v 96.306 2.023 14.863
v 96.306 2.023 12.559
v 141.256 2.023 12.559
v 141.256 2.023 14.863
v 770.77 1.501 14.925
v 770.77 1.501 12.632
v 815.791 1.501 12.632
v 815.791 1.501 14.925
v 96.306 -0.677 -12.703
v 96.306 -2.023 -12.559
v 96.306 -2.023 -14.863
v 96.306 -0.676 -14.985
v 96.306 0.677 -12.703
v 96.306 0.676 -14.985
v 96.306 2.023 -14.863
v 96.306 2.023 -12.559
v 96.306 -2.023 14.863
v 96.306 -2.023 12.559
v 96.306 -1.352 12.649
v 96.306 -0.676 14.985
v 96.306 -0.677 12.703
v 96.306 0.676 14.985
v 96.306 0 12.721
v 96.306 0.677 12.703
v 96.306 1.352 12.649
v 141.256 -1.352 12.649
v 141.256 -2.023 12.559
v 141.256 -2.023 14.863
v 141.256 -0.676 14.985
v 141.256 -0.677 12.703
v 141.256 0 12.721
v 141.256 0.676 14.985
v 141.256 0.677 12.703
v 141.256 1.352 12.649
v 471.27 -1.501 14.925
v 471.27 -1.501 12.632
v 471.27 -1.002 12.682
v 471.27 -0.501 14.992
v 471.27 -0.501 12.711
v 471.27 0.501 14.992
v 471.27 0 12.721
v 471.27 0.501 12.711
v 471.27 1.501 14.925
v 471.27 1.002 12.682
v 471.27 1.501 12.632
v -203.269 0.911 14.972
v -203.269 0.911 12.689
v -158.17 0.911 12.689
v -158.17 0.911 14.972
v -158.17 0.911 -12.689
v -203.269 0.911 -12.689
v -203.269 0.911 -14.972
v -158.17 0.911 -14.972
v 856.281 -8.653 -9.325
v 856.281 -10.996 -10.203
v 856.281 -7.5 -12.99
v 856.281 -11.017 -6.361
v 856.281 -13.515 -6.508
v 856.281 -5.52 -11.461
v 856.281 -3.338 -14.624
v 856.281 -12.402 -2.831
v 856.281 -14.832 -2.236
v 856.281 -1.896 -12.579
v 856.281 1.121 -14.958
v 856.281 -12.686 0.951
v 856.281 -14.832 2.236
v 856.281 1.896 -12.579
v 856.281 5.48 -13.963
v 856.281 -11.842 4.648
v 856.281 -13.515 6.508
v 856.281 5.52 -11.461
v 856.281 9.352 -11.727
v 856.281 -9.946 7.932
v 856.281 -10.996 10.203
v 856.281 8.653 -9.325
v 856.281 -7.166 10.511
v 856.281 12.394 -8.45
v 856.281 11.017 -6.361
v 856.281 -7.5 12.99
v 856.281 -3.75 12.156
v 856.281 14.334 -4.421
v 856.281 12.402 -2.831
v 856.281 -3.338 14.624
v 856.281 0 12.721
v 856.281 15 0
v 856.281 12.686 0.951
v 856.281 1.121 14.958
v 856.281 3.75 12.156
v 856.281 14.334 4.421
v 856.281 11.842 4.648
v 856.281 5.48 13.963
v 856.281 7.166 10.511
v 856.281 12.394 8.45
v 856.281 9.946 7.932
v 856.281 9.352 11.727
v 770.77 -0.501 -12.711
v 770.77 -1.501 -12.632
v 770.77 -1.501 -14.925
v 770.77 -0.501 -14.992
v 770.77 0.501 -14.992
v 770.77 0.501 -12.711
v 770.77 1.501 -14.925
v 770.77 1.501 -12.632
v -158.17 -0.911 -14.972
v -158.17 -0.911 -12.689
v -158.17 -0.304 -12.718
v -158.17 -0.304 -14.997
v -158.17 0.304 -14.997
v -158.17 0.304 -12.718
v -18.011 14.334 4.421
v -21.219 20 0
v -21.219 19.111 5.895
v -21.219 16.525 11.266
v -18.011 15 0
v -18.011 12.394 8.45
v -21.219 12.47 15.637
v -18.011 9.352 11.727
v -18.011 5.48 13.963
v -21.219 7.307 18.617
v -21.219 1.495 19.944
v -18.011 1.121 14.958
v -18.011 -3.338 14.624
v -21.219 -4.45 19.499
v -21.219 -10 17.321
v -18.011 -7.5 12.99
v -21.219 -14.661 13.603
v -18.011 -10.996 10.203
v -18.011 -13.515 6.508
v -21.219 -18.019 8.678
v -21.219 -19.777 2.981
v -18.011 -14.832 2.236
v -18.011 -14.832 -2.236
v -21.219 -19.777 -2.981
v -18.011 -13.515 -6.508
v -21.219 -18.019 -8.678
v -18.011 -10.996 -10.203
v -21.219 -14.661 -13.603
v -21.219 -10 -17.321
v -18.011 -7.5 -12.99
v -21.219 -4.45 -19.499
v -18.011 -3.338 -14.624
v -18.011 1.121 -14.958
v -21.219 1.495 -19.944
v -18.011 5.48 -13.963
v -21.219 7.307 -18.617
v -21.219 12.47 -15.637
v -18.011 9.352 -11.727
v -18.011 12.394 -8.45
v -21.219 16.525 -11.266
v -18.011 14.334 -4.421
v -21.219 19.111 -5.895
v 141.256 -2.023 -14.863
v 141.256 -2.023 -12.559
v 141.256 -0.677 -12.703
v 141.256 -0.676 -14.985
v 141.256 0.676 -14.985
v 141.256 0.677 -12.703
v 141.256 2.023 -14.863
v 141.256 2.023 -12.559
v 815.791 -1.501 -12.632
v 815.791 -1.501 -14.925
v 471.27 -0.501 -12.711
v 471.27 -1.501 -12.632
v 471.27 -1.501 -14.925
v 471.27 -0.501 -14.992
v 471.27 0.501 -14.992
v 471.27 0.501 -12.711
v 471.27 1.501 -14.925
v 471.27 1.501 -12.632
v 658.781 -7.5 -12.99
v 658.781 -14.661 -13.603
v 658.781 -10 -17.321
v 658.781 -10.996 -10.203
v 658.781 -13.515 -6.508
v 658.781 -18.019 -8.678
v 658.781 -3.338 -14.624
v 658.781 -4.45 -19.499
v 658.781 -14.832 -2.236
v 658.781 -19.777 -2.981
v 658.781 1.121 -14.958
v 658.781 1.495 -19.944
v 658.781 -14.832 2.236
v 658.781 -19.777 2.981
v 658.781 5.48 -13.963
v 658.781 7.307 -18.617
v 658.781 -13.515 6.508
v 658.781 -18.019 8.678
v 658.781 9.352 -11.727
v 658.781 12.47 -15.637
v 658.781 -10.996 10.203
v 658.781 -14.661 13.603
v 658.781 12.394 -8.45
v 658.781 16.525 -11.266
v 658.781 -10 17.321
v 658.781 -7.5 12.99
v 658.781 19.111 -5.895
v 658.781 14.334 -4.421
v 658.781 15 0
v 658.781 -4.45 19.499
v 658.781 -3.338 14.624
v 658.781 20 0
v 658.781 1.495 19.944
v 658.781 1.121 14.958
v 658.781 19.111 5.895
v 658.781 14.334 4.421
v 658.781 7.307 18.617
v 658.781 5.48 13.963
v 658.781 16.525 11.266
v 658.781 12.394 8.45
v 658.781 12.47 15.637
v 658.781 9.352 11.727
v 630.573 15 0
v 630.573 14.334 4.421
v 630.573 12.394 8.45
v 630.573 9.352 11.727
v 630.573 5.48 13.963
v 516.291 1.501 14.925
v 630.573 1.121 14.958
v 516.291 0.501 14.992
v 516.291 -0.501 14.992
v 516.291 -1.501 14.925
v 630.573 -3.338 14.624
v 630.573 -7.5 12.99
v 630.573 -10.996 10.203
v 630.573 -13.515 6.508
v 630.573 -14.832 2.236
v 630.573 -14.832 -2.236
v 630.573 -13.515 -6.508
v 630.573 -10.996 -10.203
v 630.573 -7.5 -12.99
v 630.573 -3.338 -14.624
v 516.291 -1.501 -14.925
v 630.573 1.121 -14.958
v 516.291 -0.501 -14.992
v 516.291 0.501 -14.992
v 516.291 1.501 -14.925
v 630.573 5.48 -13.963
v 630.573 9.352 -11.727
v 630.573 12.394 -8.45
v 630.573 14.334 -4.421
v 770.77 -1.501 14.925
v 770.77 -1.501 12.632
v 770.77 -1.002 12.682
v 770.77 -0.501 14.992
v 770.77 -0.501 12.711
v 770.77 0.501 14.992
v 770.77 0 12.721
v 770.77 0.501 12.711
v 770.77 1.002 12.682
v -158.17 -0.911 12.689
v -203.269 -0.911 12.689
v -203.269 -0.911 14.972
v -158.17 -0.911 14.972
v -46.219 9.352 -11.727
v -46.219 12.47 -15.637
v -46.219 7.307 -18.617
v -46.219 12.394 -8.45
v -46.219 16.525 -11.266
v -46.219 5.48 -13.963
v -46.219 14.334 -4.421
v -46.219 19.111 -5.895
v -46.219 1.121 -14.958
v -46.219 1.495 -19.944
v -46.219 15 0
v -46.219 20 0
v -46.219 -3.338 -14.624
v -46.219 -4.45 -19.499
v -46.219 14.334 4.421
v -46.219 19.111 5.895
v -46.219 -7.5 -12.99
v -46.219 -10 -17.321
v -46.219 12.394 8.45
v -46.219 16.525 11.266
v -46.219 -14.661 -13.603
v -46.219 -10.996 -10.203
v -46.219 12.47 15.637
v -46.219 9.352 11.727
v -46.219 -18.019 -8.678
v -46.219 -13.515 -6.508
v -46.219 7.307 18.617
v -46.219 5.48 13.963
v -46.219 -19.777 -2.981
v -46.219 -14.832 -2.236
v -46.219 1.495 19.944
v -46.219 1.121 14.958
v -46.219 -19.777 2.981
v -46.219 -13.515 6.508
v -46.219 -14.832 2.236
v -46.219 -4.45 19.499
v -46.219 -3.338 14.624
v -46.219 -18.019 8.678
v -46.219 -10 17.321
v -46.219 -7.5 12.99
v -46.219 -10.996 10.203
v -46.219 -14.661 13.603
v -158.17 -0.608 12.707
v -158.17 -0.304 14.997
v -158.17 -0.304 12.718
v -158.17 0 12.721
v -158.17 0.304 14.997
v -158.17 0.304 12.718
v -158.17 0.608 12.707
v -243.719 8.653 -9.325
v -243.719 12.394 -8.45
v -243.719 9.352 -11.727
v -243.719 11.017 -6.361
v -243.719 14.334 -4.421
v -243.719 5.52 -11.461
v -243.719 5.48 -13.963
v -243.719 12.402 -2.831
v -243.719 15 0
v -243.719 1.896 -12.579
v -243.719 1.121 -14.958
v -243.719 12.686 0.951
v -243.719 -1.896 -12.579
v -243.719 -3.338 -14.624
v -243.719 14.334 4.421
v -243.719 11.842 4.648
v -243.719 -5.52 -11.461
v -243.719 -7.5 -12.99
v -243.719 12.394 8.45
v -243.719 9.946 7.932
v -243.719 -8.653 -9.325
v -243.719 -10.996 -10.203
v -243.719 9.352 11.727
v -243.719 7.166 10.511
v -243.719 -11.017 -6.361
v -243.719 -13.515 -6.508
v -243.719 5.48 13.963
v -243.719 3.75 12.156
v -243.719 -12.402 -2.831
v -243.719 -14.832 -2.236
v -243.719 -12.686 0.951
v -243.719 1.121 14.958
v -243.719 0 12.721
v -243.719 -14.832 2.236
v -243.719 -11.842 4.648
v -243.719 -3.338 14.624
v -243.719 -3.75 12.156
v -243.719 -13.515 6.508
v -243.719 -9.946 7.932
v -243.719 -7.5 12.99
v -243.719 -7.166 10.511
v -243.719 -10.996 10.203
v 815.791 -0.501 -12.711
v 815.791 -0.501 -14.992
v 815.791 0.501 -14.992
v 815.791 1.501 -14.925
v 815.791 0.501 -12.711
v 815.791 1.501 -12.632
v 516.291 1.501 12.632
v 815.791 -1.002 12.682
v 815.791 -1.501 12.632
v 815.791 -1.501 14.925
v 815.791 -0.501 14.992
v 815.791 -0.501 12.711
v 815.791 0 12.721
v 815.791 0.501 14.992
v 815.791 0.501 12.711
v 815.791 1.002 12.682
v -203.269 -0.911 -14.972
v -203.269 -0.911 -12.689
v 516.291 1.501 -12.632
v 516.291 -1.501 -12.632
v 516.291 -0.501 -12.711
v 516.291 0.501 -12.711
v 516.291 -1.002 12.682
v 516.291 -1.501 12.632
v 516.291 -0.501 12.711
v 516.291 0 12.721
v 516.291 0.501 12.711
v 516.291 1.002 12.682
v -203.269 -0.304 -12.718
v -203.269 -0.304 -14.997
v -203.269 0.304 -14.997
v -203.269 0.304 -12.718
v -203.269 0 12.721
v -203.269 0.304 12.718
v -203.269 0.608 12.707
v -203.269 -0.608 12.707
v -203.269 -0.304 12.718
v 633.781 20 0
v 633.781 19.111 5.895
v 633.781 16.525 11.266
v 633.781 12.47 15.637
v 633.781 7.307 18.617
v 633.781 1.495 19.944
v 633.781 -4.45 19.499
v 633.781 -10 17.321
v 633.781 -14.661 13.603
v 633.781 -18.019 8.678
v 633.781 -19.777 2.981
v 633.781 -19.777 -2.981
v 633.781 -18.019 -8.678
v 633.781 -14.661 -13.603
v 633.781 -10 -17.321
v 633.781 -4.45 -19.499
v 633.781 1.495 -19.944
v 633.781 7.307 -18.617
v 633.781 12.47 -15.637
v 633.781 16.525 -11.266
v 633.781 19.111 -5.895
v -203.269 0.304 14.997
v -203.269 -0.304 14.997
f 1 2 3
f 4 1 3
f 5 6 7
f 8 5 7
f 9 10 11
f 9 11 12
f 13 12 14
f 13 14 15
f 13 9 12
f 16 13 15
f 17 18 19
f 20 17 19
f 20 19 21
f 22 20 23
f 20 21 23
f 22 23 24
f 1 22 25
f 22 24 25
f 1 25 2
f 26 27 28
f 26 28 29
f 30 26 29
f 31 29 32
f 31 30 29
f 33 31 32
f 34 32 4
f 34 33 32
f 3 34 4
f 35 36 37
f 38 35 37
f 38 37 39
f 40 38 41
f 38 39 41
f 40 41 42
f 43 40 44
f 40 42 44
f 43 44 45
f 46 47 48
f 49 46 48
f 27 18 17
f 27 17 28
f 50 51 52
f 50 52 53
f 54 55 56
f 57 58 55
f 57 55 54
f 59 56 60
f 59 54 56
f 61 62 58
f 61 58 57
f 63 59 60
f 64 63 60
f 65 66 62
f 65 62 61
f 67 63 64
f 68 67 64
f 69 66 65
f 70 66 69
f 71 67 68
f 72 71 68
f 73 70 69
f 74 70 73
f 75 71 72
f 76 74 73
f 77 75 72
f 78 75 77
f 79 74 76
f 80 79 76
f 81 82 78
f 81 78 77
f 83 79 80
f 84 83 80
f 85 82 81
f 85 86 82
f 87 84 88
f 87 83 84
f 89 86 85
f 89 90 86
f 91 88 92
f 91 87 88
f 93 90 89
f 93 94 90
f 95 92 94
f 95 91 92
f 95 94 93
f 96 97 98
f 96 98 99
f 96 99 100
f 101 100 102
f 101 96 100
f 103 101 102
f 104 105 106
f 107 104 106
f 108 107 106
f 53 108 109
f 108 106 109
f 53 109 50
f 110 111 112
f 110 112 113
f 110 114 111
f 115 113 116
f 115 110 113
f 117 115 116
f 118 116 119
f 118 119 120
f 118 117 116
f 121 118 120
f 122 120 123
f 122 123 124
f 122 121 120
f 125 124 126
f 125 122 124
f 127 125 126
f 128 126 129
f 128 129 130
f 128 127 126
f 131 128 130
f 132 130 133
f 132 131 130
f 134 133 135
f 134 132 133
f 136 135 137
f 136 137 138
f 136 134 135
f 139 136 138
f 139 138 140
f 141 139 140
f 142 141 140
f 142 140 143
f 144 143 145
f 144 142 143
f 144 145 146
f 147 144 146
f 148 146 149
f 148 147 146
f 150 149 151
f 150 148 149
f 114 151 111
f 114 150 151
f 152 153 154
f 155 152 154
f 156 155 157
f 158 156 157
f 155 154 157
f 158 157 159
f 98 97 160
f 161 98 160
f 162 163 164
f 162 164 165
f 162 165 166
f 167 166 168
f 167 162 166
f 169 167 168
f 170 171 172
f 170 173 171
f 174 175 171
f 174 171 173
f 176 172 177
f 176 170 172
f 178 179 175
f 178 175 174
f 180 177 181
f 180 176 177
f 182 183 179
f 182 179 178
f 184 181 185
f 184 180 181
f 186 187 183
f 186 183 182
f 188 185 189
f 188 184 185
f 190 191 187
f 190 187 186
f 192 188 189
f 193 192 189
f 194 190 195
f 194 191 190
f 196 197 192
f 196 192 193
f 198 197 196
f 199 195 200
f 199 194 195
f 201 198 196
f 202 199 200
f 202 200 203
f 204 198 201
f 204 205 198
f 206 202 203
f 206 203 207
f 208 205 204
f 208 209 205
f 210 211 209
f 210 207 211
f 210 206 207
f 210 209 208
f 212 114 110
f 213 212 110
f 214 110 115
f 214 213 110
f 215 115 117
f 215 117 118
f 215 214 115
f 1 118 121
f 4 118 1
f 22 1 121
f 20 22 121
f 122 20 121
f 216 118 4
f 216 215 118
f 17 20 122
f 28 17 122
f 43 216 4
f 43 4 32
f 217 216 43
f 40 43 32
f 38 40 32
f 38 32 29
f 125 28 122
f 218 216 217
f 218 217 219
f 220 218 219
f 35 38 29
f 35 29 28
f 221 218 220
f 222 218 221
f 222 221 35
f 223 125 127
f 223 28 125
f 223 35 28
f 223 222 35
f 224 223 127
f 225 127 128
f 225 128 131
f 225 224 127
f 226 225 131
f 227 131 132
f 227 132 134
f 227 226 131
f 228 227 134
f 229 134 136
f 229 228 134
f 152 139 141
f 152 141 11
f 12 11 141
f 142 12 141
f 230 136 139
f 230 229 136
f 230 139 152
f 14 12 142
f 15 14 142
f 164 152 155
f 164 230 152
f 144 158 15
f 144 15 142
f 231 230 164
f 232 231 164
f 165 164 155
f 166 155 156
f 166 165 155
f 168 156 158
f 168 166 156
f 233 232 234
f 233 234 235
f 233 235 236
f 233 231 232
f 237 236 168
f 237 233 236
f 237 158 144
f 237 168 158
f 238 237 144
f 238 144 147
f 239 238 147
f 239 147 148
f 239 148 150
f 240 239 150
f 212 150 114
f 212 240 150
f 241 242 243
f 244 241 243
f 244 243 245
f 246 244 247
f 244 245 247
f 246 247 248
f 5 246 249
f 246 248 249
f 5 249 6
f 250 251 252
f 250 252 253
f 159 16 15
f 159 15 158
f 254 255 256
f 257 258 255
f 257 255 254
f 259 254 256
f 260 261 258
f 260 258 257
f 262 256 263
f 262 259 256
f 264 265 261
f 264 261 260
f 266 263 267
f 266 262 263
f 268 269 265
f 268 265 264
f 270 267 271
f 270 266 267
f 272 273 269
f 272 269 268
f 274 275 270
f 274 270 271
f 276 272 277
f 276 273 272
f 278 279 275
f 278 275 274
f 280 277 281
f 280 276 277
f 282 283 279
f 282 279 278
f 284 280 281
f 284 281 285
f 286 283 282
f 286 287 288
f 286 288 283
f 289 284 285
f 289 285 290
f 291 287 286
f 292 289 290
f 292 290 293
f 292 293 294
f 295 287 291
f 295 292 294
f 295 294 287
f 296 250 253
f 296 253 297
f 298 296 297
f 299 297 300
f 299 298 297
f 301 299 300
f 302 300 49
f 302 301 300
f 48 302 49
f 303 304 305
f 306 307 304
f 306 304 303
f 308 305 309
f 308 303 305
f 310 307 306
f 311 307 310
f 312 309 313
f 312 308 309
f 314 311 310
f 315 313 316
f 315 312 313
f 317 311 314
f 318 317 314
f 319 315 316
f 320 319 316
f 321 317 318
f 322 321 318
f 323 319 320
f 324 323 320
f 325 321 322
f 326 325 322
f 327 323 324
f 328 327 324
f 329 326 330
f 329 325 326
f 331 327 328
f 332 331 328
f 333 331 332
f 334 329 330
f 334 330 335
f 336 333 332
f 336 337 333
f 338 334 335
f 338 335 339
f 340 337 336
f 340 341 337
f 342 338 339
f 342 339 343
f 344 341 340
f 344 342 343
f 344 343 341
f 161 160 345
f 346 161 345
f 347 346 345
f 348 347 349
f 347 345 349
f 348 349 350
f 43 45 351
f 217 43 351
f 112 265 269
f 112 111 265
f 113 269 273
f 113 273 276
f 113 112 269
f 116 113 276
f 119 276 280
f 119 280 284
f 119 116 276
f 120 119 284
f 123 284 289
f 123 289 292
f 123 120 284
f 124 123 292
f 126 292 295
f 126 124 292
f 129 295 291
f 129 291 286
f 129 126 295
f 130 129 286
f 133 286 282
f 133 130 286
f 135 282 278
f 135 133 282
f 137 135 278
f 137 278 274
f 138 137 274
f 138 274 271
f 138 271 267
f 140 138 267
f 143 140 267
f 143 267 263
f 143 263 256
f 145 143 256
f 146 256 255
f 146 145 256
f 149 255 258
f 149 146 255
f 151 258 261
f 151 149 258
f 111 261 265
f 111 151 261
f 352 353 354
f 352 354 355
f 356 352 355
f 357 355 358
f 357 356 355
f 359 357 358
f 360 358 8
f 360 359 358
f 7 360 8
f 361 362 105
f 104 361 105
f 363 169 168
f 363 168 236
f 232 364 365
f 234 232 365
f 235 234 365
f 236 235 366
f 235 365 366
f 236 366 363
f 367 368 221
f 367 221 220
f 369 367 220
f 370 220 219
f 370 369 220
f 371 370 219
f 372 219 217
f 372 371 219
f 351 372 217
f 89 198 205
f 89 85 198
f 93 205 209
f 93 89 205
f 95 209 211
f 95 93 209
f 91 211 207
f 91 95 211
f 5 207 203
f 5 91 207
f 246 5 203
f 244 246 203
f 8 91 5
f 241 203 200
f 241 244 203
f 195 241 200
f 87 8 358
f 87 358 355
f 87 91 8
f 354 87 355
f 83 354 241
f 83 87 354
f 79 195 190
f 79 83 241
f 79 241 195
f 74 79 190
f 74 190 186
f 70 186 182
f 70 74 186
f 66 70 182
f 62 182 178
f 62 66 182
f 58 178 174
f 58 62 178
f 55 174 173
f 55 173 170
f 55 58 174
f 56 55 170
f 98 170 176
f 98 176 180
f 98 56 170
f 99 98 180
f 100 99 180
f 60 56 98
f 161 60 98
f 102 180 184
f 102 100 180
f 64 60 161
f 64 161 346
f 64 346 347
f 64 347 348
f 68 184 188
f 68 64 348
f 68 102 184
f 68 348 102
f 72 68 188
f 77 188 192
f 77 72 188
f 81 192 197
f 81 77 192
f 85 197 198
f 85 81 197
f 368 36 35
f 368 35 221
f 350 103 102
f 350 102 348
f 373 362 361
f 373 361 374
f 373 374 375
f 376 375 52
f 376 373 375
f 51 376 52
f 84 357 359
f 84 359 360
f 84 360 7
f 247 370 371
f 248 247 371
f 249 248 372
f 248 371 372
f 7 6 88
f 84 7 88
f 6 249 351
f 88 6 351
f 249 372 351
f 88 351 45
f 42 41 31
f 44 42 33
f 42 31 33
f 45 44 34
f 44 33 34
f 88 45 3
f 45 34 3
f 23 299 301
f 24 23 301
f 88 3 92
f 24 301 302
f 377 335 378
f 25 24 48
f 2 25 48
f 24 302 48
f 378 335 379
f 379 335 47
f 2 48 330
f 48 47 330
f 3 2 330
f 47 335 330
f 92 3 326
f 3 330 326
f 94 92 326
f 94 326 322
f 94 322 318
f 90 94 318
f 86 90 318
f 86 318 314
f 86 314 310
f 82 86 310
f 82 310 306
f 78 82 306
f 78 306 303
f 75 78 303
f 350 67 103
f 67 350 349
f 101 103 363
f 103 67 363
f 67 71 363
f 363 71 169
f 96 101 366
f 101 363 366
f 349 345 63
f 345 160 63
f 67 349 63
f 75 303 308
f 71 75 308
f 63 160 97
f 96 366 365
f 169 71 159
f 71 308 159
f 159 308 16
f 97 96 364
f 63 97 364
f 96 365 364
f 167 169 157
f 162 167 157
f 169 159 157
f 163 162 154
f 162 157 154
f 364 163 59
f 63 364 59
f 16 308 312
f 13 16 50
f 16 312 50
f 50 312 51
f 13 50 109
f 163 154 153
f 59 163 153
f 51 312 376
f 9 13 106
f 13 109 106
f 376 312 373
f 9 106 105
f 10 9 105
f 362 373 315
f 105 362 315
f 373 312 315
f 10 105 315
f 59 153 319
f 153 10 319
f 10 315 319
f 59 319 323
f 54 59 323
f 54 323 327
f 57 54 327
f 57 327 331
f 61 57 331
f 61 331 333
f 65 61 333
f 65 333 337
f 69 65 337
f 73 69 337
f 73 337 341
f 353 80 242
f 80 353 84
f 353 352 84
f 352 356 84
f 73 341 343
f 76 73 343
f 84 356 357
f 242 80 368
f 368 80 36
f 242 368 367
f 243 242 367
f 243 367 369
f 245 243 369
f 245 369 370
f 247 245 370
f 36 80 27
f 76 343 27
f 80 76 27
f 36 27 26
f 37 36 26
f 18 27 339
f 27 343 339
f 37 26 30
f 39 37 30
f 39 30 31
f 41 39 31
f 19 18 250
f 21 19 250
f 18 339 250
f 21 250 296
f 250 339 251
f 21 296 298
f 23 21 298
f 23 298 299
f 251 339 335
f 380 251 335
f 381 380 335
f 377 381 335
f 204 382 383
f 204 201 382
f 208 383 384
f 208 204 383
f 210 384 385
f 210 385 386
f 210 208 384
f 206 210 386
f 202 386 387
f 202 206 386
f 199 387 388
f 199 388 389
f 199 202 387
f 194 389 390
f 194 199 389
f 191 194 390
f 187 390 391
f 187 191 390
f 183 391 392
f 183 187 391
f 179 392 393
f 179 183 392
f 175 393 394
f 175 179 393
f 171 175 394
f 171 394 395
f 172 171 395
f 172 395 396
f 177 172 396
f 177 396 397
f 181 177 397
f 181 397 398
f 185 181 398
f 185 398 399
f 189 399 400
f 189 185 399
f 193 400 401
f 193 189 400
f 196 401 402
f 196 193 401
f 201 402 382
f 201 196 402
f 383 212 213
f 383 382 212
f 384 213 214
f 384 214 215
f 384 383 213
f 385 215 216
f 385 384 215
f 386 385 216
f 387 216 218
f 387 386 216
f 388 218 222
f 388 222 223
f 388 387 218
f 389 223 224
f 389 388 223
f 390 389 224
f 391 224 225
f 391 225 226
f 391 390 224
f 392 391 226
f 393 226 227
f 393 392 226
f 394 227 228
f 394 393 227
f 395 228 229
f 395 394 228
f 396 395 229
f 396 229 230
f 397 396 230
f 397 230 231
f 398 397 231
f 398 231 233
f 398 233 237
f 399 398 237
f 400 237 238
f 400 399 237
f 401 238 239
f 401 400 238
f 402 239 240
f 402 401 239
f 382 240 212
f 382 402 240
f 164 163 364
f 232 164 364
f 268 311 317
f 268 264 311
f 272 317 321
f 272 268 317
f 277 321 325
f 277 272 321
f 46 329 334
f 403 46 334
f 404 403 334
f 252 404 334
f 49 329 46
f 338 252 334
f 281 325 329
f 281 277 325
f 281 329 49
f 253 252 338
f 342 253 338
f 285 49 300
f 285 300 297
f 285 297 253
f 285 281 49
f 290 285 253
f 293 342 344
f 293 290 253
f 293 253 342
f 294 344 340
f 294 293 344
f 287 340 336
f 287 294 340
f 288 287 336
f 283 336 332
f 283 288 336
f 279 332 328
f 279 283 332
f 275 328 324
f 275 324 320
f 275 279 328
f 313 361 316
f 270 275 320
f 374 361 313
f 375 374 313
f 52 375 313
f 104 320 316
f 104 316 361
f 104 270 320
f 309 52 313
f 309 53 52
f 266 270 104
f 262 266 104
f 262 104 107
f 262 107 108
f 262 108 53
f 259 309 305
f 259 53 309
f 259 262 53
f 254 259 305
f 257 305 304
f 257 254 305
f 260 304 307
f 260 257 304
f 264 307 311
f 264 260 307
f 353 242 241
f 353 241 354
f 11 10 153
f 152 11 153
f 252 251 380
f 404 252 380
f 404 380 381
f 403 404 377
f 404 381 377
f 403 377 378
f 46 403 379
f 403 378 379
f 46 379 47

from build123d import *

# Parameters (mm, degrees)
SKETCH5_R               = 12.721239978
CUT_EXTRUDE1_DEPTH      = 1100
CUT_EXTRUDE1_DEPTH_BACK = 1100
SKETCH4_4_W             = 45.098856354
SKETCH4_4_H             = 1.822787056
SKETCH4_4_W_2           = 44.950171806
SKETCH4_4_H_2           = 4.046424606
SKETCH4_4_W_3           = 45.020896592
SKETCH4_4_H_3           = 3.001393106
CUT_EXTRUDE2_DEPTH      = 21
CUT_EXTRUDE2_DEPTH_BACK = 21


with BuildPart() as part:
    # Sketch4 → Revolve-Thin1 (revolve)
    with BuildSketch(Plane.XY):
        Polygon((-243.719110407, 0), (-243.719110407, 15), (-46.219110407, 15), (-46.219110407, 20), (-21.219110407, 20), (-18.010973852, 15), (630.572753038, 15), (633.780889593, 20), (658.780889593, 20), (658.780889593, 15), (856.280889593, 15), (856.280889593, 0), (846.280889593, 0), (846.280889593, 5), (648.780889593, 5), (648.780889593, 10), (639.246054132, 10), (636.037917577, 5), (-23.476138391, 5), (-26.684274946, 10), (-36.219110407, 10), (-36.219110407, 5), (-233.719110407, 5), (-233.719110407, 0), align=None)
    revolve(axis=Axis((-243.719110407, 0, 0), (1, 0, 0)))

    # Sketch5 → Cut-Extrude1 (cut, two sides)
    with BuildSketch(Plane.ZY.offset(243.719110407)) as cut_extrude1_sk:
        Circle(SKETCH5_R)
    extrude(amount=CUT_EXTRUDE1_DEPTH, mode=Mode.SUBTRACT)
    extrude(cut_extrude1_sk.sketch, amount=-CUT_EXTRUDE1_DEPTH_BACK, mode=Mode.SUBTRACT)

    # Sketch4_4 → Cut-Extrude2 (cut, two sides)
    with BuildSketch(Plane.XY) as cut_extrude2_sk:
        with Locations((-180.719110407, 0)):
            Rectangle(SKETCH4_4_W, SKETCH4_4_H)
        with Locations((118.780889593, 0)):
            Rectangle(SKETCH4_4_W_2, SKETCH4_4_H_2)
        with Locations((493.780889593, 0)):
            Rectangle(SKETCH4_4_W_3, SKETCH4_4_H_3)
        with Locations((793.280889593, 0)):
            Rectangle(SKETCH4_4_W_3, SKETCH4_4_H_3)
    extrude(amount=CUT_EXTRUDE2_DEPTH, mode=Mode.SUBTRACT)
    extrude(cut_extrude2_sk.sketch, amount=-CUT_EXTRUDE2_DEPTH_BACK, mode=Mode.SUBTRACT)


solid = part.part
